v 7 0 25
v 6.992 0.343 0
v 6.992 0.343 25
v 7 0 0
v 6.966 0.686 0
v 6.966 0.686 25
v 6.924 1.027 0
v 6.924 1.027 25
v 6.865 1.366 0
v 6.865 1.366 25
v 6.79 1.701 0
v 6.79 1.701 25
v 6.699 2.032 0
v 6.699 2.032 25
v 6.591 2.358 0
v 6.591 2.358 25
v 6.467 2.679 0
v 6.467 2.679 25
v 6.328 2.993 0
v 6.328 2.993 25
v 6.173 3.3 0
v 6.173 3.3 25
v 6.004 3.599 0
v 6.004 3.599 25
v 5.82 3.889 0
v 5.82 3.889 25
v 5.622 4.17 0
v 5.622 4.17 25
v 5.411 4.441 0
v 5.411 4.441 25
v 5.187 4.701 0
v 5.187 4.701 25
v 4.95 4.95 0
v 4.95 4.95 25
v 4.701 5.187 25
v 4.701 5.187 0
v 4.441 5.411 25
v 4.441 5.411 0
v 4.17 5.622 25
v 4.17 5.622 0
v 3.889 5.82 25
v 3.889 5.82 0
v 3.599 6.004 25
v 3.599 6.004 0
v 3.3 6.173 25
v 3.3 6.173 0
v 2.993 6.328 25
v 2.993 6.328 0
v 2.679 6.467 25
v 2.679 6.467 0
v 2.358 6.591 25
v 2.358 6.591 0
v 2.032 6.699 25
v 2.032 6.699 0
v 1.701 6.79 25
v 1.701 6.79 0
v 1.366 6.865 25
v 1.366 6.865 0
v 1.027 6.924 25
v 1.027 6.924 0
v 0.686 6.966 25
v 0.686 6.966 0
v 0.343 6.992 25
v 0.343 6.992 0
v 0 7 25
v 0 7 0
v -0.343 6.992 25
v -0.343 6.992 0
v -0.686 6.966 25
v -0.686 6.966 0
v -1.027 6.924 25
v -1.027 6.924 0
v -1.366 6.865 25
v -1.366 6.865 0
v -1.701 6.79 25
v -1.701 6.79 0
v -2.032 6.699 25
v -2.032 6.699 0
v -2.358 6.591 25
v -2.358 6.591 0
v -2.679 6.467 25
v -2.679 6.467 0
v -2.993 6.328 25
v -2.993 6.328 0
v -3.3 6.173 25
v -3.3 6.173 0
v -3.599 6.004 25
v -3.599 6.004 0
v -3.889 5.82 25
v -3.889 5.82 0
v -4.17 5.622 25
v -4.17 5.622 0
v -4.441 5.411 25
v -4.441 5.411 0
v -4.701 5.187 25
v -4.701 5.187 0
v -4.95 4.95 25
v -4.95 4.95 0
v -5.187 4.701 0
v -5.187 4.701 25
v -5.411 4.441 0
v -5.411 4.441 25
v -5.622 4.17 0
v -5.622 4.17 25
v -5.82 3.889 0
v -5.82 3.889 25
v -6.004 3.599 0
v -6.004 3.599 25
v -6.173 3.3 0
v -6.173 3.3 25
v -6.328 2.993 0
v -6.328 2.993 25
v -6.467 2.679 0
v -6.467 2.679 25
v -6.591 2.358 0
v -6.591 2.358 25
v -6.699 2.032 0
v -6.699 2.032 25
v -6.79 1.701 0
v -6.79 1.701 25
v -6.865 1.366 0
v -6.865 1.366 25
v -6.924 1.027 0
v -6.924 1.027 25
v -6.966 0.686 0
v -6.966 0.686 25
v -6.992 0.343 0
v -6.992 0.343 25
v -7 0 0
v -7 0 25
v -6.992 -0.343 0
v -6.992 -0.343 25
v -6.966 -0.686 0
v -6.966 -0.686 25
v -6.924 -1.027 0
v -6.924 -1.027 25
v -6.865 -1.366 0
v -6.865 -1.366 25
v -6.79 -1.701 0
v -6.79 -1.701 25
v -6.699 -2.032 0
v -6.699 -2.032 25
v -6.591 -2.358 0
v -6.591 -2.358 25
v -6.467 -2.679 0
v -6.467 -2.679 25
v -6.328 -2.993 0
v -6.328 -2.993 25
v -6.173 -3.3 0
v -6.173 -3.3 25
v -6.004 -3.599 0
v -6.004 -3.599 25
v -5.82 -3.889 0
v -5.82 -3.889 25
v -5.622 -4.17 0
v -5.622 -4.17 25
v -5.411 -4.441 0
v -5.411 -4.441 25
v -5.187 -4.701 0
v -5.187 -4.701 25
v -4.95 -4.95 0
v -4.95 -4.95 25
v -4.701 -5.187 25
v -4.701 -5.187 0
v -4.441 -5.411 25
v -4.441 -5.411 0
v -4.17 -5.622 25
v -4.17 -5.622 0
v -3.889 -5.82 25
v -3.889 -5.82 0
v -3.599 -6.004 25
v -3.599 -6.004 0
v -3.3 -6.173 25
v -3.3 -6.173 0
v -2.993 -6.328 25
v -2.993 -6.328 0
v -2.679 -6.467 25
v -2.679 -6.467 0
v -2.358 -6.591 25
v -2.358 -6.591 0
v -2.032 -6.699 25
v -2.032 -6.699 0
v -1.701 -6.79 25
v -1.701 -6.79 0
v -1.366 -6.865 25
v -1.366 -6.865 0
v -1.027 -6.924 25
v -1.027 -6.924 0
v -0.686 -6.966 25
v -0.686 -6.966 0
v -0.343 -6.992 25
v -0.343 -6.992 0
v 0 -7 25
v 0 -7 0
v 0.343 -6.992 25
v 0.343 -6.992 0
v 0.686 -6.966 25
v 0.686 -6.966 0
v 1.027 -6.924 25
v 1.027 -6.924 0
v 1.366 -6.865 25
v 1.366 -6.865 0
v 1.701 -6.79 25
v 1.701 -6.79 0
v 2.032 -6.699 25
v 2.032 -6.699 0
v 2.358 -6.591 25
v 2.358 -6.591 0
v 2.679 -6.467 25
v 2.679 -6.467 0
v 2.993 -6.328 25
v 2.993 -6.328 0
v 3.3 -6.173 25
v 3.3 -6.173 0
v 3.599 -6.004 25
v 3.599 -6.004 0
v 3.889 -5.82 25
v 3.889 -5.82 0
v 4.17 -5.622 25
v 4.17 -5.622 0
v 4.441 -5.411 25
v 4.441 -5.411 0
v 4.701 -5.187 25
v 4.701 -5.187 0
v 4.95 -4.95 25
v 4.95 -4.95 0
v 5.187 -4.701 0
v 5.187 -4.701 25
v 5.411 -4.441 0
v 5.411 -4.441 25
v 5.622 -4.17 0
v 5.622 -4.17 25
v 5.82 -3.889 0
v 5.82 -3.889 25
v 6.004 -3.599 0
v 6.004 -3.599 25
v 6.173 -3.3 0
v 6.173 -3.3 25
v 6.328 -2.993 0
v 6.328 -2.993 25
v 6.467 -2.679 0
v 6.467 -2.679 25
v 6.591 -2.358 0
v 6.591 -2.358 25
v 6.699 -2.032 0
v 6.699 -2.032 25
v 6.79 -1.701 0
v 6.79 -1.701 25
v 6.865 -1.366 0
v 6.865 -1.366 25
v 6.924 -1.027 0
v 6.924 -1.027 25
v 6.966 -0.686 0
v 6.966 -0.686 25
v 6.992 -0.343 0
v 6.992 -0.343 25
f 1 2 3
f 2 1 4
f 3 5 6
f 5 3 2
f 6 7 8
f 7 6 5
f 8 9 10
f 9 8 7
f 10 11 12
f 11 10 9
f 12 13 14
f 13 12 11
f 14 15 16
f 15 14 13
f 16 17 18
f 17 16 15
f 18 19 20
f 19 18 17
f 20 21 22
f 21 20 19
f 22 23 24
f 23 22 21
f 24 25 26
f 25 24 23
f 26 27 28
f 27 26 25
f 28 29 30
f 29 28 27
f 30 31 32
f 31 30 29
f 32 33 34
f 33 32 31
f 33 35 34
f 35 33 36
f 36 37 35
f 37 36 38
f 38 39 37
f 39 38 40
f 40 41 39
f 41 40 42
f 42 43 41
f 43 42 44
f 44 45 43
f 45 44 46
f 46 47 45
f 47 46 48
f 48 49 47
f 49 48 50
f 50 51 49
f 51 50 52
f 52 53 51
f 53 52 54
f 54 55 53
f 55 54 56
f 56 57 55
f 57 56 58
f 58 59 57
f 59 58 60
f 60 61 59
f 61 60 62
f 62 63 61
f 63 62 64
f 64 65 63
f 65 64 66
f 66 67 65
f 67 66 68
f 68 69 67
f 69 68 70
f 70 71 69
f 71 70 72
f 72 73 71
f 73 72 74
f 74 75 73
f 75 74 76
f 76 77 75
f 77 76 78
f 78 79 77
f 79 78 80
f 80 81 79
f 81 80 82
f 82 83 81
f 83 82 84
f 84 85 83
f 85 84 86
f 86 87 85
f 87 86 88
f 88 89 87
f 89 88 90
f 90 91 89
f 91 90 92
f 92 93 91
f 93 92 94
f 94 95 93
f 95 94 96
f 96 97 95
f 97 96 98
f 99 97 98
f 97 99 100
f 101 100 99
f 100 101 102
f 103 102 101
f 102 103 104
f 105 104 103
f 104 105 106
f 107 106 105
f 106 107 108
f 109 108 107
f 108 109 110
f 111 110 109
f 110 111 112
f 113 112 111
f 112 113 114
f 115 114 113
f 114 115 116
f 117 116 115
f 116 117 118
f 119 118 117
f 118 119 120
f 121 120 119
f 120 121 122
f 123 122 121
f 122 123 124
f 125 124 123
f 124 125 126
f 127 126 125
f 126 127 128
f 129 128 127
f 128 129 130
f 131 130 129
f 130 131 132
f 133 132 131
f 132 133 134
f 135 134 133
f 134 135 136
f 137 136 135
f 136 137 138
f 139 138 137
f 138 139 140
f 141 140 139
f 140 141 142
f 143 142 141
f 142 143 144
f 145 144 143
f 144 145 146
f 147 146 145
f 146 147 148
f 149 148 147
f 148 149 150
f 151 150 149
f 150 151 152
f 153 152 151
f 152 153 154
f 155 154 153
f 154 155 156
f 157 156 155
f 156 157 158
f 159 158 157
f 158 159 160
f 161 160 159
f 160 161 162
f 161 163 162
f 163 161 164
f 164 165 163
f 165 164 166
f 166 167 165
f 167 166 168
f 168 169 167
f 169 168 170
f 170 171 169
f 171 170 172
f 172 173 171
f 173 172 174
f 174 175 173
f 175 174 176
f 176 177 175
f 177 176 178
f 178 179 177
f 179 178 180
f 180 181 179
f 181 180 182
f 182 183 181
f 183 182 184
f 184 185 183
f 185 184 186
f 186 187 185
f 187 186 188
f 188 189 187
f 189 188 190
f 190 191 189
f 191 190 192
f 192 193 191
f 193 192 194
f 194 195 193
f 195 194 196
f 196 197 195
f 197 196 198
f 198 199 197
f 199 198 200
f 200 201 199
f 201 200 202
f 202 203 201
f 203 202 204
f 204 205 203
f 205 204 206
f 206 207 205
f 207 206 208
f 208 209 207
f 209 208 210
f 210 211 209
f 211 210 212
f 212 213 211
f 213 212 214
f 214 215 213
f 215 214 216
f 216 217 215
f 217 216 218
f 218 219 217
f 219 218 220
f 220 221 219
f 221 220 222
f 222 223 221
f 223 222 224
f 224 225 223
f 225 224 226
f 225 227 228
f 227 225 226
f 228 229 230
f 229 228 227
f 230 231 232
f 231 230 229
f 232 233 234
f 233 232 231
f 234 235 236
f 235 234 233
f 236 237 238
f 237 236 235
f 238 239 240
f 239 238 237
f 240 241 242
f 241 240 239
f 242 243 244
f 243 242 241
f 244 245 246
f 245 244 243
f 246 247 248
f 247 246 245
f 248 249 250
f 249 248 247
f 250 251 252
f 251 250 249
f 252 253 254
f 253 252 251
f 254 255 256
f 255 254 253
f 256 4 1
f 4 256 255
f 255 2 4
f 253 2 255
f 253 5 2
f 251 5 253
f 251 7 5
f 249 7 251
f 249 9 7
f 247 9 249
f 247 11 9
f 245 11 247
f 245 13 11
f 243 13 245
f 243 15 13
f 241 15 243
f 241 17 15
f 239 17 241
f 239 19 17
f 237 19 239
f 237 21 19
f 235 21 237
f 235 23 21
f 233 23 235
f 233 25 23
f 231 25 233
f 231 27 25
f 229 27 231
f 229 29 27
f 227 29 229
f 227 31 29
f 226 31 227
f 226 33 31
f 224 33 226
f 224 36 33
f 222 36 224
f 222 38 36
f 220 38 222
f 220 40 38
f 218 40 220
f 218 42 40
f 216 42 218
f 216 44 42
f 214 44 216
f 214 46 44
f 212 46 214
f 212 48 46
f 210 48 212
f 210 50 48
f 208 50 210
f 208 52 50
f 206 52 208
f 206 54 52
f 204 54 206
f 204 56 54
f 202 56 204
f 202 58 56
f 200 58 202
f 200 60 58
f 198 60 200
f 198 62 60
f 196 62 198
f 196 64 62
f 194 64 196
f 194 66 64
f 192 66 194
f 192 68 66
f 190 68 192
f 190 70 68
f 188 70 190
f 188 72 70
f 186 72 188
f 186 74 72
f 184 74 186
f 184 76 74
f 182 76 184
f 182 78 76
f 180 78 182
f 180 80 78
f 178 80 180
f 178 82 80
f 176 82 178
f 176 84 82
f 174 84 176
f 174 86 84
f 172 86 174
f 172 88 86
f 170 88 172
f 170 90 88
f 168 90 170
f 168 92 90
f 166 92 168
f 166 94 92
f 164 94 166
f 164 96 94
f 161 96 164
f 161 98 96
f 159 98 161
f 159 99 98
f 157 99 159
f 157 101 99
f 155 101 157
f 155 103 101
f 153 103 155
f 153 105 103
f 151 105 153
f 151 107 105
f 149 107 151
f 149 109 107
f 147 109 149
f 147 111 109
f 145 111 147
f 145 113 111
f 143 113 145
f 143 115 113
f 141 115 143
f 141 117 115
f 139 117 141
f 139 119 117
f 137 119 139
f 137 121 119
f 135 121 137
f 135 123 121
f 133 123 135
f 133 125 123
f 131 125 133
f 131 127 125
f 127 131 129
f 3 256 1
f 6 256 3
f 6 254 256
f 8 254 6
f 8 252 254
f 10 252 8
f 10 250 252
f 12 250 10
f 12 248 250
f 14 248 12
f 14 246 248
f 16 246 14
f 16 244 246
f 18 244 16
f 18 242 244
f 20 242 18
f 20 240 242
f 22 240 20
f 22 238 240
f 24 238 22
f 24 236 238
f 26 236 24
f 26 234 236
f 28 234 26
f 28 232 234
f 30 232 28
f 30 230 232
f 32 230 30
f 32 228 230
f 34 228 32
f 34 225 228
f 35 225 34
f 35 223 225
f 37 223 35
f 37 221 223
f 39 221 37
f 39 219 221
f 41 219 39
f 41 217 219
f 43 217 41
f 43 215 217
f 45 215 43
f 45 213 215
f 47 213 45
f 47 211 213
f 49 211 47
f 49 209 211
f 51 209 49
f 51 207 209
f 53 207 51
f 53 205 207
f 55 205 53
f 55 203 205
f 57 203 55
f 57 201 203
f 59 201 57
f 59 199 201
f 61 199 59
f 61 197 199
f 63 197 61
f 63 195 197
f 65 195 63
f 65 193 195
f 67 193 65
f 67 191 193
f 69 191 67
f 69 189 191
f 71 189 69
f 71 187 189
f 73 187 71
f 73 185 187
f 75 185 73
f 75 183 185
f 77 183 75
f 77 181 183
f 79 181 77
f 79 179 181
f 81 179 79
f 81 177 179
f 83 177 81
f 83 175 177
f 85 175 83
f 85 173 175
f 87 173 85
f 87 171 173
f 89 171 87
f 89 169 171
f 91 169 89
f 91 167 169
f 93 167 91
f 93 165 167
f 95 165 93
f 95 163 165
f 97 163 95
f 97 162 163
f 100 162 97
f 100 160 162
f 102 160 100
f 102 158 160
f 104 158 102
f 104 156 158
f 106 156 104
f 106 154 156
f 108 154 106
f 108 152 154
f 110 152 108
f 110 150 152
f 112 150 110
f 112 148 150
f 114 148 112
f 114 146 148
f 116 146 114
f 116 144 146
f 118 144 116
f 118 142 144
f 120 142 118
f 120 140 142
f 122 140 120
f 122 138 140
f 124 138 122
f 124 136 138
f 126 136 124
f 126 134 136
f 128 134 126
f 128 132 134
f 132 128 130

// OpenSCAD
svg_file = "";
scale_factor = 2.8;
height = 5;

add_handle = true;

handle_diameter = 14;
handle_height = 25;

handle_x = 0;
handle_y = 0;

module base_shape() {
    offset(delta = 0.01)
        offset(delta = -0.01)
            import(file = svg_file, center = true, dpi = 96);
}

union() {
    
        scale([scale_factor, scale_factor, 1])
            linear_extrude(height = height, center = false)
                base_shape();

        if (add_handle) {
            translate([handle_x, handle_y, 0])
                cylinder(h = handle_height, d = handle_diameter, $fn = 128);
        }
}
